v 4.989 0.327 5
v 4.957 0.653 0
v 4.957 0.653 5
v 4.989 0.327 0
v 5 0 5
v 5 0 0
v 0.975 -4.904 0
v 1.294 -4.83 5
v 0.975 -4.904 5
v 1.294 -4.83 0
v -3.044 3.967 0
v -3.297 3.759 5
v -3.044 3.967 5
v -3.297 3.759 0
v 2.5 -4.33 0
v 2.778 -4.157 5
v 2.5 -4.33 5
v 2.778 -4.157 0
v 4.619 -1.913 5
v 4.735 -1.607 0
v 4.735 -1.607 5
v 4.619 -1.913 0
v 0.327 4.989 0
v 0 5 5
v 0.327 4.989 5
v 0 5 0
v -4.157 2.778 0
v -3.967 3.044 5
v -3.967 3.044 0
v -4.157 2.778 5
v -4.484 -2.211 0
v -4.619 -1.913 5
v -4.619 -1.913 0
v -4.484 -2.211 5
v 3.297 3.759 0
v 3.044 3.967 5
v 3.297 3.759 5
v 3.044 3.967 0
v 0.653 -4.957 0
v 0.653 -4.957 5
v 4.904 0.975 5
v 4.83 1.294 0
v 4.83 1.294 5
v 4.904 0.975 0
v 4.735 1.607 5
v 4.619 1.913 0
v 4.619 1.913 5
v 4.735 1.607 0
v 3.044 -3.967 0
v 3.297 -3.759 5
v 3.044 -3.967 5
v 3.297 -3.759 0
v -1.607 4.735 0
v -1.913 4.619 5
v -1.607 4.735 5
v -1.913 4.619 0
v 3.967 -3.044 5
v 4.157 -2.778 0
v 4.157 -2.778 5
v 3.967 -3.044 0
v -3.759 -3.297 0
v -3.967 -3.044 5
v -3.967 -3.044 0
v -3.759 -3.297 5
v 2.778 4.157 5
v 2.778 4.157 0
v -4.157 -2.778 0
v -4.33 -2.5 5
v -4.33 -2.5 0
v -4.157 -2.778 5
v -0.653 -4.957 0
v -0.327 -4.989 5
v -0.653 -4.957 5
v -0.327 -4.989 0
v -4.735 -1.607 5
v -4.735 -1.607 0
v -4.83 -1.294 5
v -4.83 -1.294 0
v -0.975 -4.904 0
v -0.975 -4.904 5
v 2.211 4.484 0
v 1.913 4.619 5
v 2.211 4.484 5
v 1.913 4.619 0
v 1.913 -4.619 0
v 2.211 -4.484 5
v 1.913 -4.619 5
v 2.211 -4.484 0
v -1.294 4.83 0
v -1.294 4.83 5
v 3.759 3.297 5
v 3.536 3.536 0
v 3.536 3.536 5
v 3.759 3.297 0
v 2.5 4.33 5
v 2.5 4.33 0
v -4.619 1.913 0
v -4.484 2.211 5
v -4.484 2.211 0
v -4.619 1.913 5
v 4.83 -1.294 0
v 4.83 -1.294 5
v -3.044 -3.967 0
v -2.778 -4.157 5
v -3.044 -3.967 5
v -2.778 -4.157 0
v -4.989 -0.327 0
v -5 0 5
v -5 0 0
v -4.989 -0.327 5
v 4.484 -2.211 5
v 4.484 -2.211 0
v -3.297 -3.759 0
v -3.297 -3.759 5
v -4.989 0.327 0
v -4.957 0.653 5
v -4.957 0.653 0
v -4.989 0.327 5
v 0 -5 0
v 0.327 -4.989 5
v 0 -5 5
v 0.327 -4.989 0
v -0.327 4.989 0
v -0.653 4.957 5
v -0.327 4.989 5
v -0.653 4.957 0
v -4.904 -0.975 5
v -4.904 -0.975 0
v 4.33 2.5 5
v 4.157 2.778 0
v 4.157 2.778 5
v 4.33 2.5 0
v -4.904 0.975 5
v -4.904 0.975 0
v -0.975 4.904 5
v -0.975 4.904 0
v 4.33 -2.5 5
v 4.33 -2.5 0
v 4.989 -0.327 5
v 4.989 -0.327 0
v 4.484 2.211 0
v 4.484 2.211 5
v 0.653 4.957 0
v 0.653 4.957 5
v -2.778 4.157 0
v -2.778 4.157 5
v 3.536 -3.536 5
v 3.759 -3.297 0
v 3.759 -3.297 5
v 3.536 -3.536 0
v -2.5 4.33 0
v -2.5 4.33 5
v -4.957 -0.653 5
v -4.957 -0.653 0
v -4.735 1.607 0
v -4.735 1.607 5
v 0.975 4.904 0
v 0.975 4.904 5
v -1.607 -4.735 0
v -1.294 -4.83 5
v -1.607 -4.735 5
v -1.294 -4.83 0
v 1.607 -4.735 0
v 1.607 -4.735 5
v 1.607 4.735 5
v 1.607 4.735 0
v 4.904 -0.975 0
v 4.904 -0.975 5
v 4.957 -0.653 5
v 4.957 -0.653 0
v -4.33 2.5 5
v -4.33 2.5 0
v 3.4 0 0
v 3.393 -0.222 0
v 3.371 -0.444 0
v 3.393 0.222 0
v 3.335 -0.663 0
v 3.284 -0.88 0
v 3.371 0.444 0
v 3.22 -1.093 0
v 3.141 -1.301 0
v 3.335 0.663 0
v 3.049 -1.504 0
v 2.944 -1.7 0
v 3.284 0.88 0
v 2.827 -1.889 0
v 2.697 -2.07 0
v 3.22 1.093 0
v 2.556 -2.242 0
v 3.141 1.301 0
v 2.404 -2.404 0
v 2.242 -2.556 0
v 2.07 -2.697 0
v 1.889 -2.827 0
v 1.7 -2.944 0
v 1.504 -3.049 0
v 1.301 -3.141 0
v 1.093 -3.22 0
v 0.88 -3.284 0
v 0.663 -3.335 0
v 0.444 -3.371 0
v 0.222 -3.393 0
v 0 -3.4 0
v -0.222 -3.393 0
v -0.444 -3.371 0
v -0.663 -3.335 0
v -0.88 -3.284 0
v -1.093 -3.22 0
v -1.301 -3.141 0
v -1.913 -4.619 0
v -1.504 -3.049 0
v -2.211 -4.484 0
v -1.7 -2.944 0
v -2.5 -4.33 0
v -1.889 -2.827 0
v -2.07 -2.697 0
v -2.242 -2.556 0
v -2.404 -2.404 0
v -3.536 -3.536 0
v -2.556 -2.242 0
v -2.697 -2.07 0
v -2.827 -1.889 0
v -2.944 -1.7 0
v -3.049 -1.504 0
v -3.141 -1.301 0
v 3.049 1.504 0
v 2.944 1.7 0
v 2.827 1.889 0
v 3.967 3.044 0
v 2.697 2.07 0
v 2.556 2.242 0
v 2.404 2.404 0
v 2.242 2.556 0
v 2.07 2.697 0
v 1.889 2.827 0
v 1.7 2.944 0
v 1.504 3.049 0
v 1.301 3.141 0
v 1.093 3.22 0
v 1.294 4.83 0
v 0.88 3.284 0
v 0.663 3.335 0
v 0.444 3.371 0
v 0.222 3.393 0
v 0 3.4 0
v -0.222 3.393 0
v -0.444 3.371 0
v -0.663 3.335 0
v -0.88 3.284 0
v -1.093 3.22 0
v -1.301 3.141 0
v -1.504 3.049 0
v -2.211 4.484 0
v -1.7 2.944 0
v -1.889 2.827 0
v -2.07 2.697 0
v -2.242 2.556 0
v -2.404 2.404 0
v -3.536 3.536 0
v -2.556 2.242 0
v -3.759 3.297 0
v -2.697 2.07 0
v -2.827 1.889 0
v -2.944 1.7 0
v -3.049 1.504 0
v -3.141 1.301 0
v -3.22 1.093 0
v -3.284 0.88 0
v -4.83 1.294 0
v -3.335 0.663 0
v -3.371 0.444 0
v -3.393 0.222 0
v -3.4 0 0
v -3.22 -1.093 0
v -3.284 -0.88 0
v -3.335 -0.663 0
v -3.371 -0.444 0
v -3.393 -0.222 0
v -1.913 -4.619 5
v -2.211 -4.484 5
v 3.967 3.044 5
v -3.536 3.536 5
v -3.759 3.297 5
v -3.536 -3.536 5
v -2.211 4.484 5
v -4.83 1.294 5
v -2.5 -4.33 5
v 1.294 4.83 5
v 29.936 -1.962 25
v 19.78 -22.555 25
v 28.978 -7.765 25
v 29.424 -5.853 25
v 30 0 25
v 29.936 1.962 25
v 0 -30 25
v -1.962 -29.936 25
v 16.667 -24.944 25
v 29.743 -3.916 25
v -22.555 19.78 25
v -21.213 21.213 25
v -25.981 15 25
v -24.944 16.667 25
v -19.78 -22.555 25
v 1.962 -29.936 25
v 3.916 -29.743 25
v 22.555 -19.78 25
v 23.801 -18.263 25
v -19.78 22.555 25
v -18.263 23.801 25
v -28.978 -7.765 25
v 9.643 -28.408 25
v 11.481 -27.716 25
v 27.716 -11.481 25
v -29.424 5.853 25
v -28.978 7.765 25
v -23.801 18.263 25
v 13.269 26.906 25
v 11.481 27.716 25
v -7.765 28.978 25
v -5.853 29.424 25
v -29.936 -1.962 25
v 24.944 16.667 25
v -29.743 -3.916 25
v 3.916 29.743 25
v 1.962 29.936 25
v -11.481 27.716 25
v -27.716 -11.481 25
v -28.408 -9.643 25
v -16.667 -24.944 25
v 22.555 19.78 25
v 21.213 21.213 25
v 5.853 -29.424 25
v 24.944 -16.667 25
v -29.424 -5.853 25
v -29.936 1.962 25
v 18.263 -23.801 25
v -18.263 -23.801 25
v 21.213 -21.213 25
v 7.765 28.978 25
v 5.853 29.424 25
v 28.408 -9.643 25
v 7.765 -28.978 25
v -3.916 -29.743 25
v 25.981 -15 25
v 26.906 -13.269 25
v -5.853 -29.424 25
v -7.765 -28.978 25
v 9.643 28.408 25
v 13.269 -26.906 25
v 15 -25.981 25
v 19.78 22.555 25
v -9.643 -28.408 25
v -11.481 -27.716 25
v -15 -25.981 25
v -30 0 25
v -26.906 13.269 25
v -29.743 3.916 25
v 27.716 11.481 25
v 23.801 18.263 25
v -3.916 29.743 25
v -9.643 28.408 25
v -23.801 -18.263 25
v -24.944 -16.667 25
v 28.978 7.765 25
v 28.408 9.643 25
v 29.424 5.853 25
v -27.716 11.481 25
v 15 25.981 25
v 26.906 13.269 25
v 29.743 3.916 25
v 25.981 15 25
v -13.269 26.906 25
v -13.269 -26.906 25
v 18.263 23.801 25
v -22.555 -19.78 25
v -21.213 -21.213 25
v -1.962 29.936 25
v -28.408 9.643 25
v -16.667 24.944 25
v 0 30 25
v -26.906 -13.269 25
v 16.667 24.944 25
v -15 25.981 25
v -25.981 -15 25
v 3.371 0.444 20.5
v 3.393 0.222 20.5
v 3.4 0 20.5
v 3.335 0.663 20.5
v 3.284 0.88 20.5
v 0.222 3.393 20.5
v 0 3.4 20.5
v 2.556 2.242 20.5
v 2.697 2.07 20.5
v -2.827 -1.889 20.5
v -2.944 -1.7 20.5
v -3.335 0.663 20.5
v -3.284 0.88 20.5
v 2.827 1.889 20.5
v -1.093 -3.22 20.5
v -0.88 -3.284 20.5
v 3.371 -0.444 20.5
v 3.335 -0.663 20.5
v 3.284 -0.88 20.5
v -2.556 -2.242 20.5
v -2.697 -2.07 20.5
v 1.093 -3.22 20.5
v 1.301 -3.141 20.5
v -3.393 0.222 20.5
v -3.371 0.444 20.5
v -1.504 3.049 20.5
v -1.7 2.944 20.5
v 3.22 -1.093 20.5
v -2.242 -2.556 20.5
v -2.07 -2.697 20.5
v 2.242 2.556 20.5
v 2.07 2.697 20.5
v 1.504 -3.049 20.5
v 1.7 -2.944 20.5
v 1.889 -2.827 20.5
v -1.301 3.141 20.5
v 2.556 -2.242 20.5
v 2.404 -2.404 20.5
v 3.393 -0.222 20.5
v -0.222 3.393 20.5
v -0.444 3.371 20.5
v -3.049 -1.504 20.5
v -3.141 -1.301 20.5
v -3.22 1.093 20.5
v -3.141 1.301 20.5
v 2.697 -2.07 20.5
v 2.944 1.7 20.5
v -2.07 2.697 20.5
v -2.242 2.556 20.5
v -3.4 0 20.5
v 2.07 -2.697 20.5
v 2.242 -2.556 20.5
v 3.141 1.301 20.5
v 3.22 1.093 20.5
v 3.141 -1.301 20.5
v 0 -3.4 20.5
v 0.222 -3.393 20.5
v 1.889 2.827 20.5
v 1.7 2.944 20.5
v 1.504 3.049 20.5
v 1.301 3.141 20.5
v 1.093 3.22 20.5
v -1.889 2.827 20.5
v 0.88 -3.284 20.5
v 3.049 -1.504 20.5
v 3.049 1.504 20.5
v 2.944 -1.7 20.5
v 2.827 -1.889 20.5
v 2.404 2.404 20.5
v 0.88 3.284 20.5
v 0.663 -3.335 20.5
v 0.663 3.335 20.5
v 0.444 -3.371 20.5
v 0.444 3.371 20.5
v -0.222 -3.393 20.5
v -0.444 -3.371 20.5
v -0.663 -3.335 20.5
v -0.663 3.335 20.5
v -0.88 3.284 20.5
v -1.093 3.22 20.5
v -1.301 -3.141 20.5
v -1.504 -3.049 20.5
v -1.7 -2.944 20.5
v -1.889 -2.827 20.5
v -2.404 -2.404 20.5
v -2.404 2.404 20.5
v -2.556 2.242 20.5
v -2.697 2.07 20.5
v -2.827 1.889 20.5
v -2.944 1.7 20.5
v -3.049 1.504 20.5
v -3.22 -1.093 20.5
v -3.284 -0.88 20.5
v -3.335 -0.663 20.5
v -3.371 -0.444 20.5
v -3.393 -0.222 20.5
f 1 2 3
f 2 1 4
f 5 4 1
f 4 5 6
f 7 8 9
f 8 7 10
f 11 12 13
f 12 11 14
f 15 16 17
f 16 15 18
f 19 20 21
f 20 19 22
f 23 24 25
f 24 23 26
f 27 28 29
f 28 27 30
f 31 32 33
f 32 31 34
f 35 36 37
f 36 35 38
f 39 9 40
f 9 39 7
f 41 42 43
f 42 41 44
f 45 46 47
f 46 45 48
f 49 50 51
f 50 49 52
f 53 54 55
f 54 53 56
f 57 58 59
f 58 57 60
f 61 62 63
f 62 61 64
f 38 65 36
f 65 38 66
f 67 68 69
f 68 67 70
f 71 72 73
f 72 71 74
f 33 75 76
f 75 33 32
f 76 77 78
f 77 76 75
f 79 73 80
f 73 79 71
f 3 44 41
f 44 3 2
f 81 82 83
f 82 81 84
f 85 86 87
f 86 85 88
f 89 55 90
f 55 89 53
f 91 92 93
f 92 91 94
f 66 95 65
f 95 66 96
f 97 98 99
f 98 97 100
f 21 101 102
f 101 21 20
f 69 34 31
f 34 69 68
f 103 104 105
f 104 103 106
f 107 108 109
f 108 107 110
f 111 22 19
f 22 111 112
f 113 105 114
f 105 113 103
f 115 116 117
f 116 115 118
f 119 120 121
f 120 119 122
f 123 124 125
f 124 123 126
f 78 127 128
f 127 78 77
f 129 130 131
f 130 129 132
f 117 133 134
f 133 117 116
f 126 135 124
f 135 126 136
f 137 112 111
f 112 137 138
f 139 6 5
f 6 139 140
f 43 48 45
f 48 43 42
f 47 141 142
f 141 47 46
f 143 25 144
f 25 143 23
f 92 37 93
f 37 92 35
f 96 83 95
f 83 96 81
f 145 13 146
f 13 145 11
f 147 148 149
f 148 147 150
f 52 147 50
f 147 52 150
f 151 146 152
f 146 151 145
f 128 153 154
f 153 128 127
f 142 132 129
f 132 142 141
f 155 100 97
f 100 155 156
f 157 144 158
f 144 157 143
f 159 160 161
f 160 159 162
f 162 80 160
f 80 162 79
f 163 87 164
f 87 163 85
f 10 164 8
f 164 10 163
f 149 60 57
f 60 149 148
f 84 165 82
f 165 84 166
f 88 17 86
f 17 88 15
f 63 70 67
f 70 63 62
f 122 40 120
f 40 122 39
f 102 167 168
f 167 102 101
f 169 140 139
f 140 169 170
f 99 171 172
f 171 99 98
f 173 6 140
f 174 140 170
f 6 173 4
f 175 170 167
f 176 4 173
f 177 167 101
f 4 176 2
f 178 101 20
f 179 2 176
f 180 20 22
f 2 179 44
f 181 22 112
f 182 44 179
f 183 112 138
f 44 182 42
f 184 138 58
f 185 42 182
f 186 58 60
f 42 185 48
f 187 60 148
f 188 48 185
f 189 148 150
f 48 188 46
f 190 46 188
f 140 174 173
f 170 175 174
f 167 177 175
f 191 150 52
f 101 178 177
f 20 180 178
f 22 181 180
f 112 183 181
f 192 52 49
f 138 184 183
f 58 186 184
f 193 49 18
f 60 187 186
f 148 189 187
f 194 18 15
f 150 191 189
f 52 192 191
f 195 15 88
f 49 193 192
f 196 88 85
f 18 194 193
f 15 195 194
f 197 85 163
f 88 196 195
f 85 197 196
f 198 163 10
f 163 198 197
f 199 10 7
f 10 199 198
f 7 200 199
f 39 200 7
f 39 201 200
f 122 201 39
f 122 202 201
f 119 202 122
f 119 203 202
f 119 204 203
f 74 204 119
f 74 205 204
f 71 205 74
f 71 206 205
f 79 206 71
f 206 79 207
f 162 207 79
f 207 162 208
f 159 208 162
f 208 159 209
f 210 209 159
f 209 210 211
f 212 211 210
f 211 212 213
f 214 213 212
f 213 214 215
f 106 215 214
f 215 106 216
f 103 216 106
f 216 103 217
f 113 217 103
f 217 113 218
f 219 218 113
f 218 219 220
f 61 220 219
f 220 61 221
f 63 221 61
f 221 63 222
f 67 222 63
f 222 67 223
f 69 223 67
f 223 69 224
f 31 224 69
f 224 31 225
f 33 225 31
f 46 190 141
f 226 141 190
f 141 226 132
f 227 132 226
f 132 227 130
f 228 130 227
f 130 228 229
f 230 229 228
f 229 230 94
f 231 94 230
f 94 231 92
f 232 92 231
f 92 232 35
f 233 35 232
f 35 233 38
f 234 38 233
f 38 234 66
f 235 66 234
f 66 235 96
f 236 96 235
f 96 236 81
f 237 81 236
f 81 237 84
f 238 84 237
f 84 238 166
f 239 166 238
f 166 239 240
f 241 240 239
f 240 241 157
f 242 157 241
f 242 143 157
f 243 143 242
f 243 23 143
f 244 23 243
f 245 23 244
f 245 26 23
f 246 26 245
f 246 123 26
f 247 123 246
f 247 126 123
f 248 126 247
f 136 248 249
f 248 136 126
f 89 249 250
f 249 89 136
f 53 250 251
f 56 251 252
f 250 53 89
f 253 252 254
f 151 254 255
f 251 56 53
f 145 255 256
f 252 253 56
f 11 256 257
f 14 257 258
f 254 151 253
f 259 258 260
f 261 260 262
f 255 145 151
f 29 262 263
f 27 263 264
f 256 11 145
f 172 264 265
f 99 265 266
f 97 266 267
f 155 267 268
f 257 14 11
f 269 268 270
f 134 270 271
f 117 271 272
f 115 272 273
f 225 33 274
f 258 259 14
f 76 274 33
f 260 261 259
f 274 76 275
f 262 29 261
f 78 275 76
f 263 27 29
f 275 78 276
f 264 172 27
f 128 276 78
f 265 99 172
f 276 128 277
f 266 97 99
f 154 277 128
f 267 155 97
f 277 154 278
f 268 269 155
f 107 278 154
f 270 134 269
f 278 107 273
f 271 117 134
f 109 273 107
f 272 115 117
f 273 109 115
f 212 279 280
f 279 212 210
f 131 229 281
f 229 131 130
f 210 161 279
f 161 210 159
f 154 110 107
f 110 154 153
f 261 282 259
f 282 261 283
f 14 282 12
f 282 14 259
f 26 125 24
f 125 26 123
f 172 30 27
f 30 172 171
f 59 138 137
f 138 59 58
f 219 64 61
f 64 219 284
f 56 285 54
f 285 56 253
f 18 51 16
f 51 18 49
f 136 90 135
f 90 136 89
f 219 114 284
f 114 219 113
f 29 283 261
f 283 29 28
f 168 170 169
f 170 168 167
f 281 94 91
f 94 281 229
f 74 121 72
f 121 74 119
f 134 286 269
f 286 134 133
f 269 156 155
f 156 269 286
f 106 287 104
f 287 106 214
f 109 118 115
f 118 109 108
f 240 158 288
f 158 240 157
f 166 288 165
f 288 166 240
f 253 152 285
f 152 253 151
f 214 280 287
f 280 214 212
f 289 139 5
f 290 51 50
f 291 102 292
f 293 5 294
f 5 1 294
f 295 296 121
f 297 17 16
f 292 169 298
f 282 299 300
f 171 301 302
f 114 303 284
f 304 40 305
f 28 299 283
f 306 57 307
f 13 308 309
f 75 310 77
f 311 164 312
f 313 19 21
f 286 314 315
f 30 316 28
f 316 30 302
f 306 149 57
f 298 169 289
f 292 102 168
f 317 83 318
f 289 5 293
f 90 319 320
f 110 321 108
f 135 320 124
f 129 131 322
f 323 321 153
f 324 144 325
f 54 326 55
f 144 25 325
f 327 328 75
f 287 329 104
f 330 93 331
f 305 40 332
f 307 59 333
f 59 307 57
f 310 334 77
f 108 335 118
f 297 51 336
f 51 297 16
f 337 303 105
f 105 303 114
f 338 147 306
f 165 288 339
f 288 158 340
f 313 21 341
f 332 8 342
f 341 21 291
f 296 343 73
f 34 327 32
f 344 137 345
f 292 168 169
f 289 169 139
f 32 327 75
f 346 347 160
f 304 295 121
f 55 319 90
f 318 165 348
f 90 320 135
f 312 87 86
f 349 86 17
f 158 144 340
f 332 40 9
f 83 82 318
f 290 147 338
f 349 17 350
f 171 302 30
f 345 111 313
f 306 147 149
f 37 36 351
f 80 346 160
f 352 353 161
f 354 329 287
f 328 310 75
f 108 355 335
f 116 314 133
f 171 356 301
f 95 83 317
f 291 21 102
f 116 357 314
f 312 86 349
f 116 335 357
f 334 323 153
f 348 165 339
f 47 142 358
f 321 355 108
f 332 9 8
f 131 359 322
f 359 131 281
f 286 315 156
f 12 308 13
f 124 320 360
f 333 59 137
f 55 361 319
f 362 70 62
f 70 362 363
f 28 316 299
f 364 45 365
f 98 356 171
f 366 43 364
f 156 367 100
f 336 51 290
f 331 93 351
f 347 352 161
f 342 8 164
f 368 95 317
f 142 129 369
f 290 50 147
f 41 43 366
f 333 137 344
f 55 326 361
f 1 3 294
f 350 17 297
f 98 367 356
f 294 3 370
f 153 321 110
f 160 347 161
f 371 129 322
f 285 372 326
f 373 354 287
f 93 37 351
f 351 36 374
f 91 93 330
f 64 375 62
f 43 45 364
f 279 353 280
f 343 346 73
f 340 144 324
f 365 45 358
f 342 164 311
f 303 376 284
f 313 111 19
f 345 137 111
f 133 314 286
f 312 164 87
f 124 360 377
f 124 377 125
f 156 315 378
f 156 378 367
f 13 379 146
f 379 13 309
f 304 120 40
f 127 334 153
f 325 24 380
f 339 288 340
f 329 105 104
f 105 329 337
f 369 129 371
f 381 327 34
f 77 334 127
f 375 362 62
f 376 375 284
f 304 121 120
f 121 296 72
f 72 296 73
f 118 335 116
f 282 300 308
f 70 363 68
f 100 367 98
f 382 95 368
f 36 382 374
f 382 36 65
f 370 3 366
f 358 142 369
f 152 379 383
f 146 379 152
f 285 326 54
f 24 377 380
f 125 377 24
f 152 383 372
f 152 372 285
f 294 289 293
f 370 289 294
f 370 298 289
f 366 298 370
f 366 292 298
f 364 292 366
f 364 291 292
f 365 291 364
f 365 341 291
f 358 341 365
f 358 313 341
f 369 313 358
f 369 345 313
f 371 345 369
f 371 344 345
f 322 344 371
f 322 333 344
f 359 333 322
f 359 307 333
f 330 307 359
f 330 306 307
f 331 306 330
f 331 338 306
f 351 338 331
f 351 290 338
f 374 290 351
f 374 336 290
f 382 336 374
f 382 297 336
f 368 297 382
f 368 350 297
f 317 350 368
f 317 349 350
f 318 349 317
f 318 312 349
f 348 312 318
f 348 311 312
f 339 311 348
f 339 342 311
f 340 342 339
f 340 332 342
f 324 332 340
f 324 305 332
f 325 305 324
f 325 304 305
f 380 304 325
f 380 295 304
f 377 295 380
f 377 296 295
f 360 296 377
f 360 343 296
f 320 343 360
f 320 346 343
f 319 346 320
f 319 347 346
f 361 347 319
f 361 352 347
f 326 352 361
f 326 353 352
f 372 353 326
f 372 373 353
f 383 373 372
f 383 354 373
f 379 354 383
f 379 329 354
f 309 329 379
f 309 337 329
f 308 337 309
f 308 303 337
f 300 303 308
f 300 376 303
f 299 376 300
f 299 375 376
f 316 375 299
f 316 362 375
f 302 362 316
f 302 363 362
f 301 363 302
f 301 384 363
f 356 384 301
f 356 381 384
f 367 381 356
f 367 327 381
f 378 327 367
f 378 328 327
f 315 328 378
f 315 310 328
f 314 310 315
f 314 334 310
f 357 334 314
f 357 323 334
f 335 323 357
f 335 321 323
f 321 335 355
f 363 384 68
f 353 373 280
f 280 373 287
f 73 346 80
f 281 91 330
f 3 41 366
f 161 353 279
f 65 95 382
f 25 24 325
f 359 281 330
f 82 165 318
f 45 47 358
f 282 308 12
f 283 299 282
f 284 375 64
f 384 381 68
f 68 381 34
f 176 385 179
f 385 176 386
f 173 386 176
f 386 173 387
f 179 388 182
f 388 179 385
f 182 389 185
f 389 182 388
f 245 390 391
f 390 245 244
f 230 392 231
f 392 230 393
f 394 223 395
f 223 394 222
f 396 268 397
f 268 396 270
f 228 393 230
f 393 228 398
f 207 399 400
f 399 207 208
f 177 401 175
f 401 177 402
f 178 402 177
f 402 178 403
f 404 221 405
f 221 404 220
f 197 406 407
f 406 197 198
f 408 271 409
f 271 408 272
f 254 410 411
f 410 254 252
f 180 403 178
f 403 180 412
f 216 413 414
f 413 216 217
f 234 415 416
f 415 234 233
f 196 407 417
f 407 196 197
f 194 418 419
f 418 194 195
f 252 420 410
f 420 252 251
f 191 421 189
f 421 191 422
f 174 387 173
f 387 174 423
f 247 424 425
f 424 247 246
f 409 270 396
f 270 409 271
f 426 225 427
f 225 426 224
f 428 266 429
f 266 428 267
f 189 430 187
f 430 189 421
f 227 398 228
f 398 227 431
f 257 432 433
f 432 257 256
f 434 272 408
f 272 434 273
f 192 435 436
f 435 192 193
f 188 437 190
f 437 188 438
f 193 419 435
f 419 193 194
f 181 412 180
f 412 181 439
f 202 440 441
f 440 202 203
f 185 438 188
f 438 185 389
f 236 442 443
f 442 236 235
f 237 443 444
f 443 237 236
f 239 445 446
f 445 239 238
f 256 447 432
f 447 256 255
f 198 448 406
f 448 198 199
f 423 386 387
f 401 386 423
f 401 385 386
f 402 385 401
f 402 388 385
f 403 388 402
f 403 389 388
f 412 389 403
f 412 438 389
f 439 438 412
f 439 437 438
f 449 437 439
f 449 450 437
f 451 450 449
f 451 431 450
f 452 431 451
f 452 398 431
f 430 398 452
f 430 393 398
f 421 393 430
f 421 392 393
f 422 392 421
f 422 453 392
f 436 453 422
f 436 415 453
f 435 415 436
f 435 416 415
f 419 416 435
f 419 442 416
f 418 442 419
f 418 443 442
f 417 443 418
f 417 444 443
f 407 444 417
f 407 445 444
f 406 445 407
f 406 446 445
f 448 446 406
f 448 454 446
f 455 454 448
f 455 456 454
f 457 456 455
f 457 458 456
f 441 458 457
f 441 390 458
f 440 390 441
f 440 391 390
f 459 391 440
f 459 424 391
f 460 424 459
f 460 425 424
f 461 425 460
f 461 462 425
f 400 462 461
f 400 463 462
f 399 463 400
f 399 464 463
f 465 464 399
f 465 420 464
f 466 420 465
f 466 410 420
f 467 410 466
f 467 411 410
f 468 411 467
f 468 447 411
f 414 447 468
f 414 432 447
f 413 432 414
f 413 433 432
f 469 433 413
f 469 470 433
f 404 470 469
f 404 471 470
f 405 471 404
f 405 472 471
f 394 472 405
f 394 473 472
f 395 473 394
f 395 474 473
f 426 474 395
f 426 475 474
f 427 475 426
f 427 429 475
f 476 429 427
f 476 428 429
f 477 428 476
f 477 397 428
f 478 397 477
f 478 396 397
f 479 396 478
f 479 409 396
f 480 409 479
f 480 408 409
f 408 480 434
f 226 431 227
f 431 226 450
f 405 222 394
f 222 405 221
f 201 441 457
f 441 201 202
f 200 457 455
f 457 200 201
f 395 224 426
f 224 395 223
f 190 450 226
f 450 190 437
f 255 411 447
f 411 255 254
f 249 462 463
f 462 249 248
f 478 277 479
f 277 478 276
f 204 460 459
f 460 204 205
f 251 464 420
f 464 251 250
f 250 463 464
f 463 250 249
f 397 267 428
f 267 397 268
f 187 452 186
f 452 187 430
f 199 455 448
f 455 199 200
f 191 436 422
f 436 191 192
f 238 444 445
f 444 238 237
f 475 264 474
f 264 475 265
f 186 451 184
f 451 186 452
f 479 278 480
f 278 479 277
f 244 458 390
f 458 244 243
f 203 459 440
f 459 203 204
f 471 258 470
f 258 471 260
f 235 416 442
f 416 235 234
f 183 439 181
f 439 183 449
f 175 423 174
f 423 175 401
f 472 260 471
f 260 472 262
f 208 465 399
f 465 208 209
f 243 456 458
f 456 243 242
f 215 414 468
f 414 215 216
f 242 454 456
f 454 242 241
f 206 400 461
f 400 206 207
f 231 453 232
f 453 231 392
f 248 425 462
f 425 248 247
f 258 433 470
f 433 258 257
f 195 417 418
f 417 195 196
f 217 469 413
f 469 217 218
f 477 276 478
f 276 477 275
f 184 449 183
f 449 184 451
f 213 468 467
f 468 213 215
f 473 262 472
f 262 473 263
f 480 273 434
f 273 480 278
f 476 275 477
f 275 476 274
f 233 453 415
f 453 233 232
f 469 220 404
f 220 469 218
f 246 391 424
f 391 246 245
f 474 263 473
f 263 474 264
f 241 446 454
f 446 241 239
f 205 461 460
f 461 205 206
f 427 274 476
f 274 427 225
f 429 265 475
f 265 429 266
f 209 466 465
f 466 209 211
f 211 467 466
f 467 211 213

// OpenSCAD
// Lab funnel - printed upright, open top and bottom
// Units: mm

// ---- Parameters ----
spout_od      = 10;    // spout outer diameter
spout_len     = 20;    // spout length (z = 0 to 20)
cone_od_top   = 60;    // cone rim outer diameter (z = 50)
cone_od_bot   = 10;    // cone base outer diameter (z = 20)
wall          = 1.6;   // wall thickness everywhere
eps           = 0.5;   // cutter overshoot past faces

$fn = 96;

// ---- Model ----
difference() {
    union() {
        // Spout (tube)
        translate([0, 0, 0])
            cylinder(d = spout_od, h = spout_len);

        // Cone (z = 20 to 50)
        translate([0, 0, cone_od_bot / 2])
            cylinder(d1 = spout_od, d2 = cone_od_top, h = spout_len);
    }

    // Through-bore: spout bore (6.8 mm) extended past both ends
    translate([0, 0, -eps])
        cylinder(d = spout_od - 2 * wall, h = spout_len + 2 * eps);
}
